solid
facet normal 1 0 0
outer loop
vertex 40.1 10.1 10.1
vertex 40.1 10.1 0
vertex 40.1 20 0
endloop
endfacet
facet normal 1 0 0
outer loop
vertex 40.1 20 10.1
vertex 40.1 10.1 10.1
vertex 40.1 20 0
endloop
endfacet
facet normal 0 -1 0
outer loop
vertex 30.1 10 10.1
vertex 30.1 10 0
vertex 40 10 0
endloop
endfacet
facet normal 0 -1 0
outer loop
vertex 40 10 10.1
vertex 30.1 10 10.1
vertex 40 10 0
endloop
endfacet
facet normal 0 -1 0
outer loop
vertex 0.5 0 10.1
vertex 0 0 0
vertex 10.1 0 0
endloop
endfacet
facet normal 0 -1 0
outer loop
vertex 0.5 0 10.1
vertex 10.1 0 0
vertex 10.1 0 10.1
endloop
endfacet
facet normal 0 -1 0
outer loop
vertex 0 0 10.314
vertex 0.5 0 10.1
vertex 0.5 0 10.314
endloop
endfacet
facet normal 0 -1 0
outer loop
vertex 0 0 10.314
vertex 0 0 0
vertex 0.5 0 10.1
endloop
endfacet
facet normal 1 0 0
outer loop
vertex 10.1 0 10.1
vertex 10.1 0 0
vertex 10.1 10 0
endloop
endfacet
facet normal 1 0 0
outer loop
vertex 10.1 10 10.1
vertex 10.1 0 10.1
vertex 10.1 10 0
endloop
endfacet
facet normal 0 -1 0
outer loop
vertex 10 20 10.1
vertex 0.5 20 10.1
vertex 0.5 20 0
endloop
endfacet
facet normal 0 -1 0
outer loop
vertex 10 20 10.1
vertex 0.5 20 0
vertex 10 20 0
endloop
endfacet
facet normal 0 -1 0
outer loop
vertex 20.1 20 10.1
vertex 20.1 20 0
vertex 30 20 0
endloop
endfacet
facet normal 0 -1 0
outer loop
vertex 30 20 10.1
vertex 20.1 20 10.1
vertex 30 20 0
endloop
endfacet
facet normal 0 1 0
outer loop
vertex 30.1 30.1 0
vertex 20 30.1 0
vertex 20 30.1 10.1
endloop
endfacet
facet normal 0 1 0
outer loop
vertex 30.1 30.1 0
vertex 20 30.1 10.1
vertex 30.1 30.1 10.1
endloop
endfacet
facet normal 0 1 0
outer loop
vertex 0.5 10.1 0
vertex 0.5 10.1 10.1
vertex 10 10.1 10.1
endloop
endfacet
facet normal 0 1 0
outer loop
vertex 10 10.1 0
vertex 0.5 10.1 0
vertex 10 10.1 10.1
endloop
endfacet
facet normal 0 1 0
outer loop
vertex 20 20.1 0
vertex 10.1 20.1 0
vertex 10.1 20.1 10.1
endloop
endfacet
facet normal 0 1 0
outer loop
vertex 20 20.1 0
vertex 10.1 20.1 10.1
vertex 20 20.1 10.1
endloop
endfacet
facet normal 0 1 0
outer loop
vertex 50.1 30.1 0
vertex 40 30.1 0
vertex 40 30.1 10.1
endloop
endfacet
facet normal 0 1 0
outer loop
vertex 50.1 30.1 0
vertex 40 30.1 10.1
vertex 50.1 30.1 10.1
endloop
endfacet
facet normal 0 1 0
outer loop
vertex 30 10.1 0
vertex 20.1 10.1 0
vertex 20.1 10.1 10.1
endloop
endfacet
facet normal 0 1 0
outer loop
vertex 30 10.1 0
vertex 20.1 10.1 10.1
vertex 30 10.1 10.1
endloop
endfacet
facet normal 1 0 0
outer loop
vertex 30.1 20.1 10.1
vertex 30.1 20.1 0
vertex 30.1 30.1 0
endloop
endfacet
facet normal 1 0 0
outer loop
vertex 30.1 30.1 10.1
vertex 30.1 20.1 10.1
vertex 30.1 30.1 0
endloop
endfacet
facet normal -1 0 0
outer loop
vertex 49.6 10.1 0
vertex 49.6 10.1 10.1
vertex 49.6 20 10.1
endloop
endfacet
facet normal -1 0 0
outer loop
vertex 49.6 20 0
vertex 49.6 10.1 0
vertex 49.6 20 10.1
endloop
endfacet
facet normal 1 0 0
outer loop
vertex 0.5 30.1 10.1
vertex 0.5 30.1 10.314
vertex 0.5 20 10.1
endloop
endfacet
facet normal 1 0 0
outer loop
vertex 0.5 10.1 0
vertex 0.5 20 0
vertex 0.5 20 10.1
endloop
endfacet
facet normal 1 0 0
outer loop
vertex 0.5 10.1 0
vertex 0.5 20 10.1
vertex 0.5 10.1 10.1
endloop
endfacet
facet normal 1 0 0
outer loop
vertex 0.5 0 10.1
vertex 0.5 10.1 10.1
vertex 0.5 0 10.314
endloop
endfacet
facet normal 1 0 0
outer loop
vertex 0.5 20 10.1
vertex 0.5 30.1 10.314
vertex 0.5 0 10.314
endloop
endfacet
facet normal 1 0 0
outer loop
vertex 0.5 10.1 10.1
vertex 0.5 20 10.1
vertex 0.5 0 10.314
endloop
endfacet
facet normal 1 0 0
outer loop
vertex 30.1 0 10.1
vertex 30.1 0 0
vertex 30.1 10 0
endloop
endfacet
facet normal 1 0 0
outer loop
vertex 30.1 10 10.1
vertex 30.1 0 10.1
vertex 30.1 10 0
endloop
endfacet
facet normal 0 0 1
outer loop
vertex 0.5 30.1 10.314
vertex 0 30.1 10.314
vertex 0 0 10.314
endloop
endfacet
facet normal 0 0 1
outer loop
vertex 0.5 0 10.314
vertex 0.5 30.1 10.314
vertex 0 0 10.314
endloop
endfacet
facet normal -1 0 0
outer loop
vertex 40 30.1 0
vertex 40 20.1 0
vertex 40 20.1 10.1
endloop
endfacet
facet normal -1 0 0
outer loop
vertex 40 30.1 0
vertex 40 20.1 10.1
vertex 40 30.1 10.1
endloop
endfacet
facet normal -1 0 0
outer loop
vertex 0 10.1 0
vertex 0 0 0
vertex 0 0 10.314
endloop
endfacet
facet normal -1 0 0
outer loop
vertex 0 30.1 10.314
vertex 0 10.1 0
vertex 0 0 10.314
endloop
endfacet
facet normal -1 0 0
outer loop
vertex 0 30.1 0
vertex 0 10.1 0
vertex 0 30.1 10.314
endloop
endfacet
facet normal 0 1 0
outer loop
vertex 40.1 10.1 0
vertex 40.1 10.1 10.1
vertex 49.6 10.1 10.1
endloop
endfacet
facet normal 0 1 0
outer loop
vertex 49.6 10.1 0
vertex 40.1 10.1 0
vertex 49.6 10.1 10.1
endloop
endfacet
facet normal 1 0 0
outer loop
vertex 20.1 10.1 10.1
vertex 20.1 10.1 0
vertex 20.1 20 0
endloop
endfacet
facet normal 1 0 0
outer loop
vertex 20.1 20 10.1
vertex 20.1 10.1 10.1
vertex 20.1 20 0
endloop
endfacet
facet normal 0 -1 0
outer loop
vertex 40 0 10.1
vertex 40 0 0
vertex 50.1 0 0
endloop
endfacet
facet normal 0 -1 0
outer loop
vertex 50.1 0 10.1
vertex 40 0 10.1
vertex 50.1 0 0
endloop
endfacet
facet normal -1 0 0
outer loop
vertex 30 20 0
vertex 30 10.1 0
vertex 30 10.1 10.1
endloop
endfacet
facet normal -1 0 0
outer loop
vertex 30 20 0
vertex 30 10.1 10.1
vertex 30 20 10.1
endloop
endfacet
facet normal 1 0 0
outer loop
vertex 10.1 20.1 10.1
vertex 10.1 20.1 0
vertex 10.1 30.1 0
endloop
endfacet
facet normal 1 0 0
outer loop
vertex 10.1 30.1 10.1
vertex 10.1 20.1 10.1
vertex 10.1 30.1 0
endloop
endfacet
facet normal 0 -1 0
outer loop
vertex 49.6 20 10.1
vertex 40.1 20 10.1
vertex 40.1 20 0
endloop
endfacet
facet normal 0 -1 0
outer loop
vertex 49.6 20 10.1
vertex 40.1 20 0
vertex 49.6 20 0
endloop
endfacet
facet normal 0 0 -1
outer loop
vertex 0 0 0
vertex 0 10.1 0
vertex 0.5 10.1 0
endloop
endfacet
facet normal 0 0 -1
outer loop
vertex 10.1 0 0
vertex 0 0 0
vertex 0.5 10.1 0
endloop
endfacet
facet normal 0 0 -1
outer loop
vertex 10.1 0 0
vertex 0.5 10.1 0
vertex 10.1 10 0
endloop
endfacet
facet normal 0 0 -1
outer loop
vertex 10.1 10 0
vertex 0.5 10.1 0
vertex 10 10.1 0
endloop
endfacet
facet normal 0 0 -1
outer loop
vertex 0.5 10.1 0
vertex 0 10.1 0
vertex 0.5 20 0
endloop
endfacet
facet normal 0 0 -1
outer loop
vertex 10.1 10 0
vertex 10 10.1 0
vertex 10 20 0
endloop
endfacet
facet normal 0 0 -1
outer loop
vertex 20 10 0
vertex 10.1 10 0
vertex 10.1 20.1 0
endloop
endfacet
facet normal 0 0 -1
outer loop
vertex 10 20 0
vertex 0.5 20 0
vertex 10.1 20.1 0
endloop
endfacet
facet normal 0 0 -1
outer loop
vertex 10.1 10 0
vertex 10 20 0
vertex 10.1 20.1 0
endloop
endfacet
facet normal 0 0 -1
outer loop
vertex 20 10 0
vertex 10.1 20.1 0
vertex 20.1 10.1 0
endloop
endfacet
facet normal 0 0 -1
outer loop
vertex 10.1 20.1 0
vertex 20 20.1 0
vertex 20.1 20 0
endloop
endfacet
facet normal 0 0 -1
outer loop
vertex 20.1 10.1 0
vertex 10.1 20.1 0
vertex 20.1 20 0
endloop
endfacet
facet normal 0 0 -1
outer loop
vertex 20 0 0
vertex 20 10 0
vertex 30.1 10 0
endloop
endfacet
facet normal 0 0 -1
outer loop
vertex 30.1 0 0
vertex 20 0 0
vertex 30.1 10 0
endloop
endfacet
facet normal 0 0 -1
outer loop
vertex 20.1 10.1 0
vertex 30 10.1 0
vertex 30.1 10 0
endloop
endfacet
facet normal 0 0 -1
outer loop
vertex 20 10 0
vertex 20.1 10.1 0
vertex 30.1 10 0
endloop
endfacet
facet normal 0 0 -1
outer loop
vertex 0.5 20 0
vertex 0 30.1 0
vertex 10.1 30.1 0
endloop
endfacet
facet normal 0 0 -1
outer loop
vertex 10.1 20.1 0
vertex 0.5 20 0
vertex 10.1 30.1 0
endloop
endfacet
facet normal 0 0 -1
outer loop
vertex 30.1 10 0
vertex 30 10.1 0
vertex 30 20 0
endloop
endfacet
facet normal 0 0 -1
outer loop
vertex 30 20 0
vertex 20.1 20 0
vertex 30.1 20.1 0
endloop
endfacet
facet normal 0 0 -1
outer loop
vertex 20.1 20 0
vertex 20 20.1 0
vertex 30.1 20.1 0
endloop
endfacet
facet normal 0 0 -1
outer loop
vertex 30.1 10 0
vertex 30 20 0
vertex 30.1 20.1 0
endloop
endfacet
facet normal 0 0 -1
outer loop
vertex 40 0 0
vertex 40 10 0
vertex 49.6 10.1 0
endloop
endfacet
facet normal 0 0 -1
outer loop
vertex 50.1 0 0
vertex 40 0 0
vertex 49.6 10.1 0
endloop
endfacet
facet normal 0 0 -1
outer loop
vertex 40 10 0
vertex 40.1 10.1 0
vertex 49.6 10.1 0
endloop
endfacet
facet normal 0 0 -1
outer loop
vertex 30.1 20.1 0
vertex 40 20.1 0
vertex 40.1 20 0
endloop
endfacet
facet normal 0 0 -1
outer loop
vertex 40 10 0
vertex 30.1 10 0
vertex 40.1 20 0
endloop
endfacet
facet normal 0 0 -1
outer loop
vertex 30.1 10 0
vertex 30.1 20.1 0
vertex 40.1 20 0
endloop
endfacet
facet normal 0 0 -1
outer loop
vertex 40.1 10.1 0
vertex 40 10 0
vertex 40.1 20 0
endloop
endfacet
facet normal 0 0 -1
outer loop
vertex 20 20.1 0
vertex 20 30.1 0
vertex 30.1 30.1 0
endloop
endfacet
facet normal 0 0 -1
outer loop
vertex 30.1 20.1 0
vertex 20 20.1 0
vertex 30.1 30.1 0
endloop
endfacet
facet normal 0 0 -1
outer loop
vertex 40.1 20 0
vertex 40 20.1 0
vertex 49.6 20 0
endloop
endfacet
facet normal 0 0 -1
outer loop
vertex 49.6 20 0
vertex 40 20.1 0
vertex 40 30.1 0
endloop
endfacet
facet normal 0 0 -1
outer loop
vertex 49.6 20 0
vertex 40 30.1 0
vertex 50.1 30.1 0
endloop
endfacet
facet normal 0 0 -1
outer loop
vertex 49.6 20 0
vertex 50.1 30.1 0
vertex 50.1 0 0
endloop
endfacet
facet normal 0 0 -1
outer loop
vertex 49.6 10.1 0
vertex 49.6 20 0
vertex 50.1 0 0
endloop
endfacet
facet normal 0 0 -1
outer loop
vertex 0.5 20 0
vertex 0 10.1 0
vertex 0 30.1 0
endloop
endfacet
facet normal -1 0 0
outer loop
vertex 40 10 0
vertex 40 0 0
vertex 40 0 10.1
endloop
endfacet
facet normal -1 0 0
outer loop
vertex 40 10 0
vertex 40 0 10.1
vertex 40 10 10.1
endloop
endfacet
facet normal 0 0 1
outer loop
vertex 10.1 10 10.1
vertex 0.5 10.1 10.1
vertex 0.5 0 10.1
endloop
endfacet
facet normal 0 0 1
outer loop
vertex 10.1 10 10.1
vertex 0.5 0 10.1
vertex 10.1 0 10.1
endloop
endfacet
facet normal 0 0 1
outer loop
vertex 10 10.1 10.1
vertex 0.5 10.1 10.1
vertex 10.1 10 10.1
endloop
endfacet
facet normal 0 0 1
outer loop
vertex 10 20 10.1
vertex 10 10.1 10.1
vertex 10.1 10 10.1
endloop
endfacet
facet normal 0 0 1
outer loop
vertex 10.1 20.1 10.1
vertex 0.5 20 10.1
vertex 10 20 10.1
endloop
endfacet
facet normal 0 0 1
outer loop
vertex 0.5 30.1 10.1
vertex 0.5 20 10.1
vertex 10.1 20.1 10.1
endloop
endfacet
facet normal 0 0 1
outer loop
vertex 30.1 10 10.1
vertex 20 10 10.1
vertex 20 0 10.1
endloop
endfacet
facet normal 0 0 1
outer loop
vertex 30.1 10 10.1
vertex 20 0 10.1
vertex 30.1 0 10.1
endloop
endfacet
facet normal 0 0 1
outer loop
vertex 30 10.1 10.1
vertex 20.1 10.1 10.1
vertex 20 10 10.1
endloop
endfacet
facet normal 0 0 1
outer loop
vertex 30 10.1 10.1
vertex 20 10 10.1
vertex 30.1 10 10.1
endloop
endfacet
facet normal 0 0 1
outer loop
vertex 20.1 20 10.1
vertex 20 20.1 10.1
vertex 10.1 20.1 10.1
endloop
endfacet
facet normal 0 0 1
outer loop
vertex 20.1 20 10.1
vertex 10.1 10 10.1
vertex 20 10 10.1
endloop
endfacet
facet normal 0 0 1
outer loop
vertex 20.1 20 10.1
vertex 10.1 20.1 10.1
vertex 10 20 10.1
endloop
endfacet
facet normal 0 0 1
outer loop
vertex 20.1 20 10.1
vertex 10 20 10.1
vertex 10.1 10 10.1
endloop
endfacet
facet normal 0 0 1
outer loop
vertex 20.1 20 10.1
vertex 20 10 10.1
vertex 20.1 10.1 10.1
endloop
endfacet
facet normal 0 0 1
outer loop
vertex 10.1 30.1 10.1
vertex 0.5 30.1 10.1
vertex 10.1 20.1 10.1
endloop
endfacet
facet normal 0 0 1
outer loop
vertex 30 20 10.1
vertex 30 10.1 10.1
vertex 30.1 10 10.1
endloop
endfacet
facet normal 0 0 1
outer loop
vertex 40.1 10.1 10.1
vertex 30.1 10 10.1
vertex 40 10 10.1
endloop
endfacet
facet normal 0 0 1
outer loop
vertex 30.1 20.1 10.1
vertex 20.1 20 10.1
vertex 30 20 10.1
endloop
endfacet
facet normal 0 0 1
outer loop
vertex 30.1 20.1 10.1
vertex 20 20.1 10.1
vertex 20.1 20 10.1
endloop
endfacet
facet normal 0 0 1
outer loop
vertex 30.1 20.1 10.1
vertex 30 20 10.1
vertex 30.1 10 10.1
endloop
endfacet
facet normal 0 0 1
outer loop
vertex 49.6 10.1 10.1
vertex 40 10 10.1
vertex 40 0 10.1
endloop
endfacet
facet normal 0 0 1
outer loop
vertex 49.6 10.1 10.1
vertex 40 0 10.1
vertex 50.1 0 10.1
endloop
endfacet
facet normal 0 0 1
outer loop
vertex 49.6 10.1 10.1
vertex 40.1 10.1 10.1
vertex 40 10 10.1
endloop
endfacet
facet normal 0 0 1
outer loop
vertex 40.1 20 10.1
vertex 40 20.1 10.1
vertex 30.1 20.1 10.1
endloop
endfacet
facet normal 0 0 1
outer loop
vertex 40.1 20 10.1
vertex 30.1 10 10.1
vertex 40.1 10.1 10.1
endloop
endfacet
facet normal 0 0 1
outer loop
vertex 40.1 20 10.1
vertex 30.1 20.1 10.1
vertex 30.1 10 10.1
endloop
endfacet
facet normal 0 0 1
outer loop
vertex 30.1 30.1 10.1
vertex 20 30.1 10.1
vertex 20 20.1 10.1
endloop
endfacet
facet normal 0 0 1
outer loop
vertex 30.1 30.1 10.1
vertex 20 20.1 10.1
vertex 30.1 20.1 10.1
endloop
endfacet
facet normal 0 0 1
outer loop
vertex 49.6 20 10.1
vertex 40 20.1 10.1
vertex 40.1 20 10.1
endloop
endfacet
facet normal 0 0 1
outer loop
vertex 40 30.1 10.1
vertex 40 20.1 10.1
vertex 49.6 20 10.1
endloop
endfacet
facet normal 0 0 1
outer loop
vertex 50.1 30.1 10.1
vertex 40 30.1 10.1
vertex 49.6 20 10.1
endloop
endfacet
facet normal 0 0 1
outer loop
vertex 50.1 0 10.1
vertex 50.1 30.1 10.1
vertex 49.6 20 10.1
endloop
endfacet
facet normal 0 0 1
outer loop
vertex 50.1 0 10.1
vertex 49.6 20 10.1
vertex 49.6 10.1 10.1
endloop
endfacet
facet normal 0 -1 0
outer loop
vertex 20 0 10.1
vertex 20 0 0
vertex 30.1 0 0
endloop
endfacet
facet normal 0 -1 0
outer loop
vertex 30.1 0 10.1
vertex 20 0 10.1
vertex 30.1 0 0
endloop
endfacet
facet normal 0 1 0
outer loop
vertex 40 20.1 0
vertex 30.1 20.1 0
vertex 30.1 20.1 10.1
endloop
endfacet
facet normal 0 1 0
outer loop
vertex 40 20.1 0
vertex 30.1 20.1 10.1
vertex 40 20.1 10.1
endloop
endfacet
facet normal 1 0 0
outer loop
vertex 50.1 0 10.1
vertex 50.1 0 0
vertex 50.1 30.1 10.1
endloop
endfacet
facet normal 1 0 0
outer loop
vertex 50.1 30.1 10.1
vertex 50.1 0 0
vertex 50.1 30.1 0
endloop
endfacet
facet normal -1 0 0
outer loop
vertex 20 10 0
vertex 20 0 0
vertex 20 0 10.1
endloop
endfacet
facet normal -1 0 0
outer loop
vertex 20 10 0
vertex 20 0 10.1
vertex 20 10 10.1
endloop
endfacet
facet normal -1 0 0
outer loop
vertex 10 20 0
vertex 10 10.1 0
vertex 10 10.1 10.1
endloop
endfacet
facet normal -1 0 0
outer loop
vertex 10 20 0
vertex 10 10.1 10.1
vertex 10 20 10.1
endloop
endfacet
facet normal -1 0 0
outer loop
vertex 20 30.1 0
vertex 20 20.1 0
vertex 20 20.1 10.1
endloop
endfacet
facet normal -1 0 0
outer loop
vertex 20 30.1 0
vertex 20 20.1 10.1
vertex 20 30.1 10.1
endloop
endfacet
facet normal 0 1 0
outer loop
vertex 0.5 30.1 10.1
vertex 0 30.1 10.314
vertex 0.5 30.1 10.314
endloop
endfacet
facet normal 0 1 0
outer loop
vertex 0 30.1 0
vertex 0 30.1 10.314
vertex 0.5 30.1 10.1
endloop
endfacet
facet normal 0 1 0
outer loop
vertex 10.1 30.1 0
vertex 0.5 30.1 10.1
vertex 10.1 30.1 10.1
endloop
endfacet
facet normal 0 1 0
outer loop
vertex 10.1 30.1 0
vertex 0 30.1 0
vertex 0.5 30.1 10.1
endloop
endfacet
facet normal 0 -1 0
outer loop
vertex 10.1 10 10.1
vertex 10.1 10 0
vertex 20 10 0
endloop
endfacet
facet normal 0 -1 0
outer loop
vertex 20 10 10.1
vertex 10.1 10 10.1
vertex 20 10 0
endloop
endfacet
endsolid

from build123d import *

# Parameters (mm, degrees)
F0_W      = 10.1
F0_H      = 10.1
F1_DEPTH  = 10.1
F9_W      = 30.1
F9_H      = 10.3136999533
F10_DEPTH = 0.5
F11_W     = 30.1
F11_H     = 10.1
F12_DEPTH = 0.5


with BuildPart() as f1:
    # F0 (on Top) → F1 (new body)
    with BuildSketch(Plane.XY):
        with Locations((5.05, 5.05)):
            Rectangle(F0_W, F0_H)
    extrude(amount=F1_DEPTH)


with BuildPart() as f2_1:
    # F2: copy of F1
    add(f1.part.moved(Location((20, 0, 0))))


with BuildPart() as f3_1:
    # F3: copy of F2_1
    add(f2_1.part.moved(Location((20, 0, 0))))


with BuildPart() as f4_1:
    # F4: copy of F1
    add(f1.part.moved(Location((10, 10, 0))))


with BuildPart() as f5_1:
    # F5: copy of F2_1
    add(f2_1.part.moved(Location((10, 10, 0))))


with BuildPart() as f6_1:
    # F6: copy of F4_1
    add(f4_1.part.moved(Location((-10, 10, 0))))


with BuildPart() as f7_1:
    # F7: copy of F4_1
    add(f4_1.part.moved(Location((10, 10, 0))))


with BuildPart() as f8_1:
    # F8: copy of F5_1
    add(f5_1.part.moved(Location((10, 10, 0))))


with BuildPart() as f1_1:
    add(f1.part)

    add(f6_1.part)  # F10 merges F6_1
    # F9 (on face) → F10 (join)
    with BuildSketch(Plane(origin=(0, 0, 0), x_dir=(0, -1, 0), z_dir=(-1, 0, 0))):
        with Locations((-15.05, 5.1568499766)):
            Rectangle(F9_W, F9_H)
    extrude(amount=-F10_DEPTH)

    add(f2_1.part)  # F12 merges F2_1

    add(f3_1.part)  # F12 merges F3_1

    add(f4_1.part)  # F12 merges F4_1

    add(f5_1.part)  # F12 merges F5_1

    add(f7_1.part)  # F12 merges F7_1

    add(f8_1.part)  # F12 merges F8_1
    # F11 (on face) → F12 (join)
    with BuildSketch(Plane.YZ.offset(50.1)):
        with Locations((15.05, 5.05)):
            Rectangle(F11_W, F11_H)
    extrude(amount=-F12_DEPTH)


solid = f1_1.part
